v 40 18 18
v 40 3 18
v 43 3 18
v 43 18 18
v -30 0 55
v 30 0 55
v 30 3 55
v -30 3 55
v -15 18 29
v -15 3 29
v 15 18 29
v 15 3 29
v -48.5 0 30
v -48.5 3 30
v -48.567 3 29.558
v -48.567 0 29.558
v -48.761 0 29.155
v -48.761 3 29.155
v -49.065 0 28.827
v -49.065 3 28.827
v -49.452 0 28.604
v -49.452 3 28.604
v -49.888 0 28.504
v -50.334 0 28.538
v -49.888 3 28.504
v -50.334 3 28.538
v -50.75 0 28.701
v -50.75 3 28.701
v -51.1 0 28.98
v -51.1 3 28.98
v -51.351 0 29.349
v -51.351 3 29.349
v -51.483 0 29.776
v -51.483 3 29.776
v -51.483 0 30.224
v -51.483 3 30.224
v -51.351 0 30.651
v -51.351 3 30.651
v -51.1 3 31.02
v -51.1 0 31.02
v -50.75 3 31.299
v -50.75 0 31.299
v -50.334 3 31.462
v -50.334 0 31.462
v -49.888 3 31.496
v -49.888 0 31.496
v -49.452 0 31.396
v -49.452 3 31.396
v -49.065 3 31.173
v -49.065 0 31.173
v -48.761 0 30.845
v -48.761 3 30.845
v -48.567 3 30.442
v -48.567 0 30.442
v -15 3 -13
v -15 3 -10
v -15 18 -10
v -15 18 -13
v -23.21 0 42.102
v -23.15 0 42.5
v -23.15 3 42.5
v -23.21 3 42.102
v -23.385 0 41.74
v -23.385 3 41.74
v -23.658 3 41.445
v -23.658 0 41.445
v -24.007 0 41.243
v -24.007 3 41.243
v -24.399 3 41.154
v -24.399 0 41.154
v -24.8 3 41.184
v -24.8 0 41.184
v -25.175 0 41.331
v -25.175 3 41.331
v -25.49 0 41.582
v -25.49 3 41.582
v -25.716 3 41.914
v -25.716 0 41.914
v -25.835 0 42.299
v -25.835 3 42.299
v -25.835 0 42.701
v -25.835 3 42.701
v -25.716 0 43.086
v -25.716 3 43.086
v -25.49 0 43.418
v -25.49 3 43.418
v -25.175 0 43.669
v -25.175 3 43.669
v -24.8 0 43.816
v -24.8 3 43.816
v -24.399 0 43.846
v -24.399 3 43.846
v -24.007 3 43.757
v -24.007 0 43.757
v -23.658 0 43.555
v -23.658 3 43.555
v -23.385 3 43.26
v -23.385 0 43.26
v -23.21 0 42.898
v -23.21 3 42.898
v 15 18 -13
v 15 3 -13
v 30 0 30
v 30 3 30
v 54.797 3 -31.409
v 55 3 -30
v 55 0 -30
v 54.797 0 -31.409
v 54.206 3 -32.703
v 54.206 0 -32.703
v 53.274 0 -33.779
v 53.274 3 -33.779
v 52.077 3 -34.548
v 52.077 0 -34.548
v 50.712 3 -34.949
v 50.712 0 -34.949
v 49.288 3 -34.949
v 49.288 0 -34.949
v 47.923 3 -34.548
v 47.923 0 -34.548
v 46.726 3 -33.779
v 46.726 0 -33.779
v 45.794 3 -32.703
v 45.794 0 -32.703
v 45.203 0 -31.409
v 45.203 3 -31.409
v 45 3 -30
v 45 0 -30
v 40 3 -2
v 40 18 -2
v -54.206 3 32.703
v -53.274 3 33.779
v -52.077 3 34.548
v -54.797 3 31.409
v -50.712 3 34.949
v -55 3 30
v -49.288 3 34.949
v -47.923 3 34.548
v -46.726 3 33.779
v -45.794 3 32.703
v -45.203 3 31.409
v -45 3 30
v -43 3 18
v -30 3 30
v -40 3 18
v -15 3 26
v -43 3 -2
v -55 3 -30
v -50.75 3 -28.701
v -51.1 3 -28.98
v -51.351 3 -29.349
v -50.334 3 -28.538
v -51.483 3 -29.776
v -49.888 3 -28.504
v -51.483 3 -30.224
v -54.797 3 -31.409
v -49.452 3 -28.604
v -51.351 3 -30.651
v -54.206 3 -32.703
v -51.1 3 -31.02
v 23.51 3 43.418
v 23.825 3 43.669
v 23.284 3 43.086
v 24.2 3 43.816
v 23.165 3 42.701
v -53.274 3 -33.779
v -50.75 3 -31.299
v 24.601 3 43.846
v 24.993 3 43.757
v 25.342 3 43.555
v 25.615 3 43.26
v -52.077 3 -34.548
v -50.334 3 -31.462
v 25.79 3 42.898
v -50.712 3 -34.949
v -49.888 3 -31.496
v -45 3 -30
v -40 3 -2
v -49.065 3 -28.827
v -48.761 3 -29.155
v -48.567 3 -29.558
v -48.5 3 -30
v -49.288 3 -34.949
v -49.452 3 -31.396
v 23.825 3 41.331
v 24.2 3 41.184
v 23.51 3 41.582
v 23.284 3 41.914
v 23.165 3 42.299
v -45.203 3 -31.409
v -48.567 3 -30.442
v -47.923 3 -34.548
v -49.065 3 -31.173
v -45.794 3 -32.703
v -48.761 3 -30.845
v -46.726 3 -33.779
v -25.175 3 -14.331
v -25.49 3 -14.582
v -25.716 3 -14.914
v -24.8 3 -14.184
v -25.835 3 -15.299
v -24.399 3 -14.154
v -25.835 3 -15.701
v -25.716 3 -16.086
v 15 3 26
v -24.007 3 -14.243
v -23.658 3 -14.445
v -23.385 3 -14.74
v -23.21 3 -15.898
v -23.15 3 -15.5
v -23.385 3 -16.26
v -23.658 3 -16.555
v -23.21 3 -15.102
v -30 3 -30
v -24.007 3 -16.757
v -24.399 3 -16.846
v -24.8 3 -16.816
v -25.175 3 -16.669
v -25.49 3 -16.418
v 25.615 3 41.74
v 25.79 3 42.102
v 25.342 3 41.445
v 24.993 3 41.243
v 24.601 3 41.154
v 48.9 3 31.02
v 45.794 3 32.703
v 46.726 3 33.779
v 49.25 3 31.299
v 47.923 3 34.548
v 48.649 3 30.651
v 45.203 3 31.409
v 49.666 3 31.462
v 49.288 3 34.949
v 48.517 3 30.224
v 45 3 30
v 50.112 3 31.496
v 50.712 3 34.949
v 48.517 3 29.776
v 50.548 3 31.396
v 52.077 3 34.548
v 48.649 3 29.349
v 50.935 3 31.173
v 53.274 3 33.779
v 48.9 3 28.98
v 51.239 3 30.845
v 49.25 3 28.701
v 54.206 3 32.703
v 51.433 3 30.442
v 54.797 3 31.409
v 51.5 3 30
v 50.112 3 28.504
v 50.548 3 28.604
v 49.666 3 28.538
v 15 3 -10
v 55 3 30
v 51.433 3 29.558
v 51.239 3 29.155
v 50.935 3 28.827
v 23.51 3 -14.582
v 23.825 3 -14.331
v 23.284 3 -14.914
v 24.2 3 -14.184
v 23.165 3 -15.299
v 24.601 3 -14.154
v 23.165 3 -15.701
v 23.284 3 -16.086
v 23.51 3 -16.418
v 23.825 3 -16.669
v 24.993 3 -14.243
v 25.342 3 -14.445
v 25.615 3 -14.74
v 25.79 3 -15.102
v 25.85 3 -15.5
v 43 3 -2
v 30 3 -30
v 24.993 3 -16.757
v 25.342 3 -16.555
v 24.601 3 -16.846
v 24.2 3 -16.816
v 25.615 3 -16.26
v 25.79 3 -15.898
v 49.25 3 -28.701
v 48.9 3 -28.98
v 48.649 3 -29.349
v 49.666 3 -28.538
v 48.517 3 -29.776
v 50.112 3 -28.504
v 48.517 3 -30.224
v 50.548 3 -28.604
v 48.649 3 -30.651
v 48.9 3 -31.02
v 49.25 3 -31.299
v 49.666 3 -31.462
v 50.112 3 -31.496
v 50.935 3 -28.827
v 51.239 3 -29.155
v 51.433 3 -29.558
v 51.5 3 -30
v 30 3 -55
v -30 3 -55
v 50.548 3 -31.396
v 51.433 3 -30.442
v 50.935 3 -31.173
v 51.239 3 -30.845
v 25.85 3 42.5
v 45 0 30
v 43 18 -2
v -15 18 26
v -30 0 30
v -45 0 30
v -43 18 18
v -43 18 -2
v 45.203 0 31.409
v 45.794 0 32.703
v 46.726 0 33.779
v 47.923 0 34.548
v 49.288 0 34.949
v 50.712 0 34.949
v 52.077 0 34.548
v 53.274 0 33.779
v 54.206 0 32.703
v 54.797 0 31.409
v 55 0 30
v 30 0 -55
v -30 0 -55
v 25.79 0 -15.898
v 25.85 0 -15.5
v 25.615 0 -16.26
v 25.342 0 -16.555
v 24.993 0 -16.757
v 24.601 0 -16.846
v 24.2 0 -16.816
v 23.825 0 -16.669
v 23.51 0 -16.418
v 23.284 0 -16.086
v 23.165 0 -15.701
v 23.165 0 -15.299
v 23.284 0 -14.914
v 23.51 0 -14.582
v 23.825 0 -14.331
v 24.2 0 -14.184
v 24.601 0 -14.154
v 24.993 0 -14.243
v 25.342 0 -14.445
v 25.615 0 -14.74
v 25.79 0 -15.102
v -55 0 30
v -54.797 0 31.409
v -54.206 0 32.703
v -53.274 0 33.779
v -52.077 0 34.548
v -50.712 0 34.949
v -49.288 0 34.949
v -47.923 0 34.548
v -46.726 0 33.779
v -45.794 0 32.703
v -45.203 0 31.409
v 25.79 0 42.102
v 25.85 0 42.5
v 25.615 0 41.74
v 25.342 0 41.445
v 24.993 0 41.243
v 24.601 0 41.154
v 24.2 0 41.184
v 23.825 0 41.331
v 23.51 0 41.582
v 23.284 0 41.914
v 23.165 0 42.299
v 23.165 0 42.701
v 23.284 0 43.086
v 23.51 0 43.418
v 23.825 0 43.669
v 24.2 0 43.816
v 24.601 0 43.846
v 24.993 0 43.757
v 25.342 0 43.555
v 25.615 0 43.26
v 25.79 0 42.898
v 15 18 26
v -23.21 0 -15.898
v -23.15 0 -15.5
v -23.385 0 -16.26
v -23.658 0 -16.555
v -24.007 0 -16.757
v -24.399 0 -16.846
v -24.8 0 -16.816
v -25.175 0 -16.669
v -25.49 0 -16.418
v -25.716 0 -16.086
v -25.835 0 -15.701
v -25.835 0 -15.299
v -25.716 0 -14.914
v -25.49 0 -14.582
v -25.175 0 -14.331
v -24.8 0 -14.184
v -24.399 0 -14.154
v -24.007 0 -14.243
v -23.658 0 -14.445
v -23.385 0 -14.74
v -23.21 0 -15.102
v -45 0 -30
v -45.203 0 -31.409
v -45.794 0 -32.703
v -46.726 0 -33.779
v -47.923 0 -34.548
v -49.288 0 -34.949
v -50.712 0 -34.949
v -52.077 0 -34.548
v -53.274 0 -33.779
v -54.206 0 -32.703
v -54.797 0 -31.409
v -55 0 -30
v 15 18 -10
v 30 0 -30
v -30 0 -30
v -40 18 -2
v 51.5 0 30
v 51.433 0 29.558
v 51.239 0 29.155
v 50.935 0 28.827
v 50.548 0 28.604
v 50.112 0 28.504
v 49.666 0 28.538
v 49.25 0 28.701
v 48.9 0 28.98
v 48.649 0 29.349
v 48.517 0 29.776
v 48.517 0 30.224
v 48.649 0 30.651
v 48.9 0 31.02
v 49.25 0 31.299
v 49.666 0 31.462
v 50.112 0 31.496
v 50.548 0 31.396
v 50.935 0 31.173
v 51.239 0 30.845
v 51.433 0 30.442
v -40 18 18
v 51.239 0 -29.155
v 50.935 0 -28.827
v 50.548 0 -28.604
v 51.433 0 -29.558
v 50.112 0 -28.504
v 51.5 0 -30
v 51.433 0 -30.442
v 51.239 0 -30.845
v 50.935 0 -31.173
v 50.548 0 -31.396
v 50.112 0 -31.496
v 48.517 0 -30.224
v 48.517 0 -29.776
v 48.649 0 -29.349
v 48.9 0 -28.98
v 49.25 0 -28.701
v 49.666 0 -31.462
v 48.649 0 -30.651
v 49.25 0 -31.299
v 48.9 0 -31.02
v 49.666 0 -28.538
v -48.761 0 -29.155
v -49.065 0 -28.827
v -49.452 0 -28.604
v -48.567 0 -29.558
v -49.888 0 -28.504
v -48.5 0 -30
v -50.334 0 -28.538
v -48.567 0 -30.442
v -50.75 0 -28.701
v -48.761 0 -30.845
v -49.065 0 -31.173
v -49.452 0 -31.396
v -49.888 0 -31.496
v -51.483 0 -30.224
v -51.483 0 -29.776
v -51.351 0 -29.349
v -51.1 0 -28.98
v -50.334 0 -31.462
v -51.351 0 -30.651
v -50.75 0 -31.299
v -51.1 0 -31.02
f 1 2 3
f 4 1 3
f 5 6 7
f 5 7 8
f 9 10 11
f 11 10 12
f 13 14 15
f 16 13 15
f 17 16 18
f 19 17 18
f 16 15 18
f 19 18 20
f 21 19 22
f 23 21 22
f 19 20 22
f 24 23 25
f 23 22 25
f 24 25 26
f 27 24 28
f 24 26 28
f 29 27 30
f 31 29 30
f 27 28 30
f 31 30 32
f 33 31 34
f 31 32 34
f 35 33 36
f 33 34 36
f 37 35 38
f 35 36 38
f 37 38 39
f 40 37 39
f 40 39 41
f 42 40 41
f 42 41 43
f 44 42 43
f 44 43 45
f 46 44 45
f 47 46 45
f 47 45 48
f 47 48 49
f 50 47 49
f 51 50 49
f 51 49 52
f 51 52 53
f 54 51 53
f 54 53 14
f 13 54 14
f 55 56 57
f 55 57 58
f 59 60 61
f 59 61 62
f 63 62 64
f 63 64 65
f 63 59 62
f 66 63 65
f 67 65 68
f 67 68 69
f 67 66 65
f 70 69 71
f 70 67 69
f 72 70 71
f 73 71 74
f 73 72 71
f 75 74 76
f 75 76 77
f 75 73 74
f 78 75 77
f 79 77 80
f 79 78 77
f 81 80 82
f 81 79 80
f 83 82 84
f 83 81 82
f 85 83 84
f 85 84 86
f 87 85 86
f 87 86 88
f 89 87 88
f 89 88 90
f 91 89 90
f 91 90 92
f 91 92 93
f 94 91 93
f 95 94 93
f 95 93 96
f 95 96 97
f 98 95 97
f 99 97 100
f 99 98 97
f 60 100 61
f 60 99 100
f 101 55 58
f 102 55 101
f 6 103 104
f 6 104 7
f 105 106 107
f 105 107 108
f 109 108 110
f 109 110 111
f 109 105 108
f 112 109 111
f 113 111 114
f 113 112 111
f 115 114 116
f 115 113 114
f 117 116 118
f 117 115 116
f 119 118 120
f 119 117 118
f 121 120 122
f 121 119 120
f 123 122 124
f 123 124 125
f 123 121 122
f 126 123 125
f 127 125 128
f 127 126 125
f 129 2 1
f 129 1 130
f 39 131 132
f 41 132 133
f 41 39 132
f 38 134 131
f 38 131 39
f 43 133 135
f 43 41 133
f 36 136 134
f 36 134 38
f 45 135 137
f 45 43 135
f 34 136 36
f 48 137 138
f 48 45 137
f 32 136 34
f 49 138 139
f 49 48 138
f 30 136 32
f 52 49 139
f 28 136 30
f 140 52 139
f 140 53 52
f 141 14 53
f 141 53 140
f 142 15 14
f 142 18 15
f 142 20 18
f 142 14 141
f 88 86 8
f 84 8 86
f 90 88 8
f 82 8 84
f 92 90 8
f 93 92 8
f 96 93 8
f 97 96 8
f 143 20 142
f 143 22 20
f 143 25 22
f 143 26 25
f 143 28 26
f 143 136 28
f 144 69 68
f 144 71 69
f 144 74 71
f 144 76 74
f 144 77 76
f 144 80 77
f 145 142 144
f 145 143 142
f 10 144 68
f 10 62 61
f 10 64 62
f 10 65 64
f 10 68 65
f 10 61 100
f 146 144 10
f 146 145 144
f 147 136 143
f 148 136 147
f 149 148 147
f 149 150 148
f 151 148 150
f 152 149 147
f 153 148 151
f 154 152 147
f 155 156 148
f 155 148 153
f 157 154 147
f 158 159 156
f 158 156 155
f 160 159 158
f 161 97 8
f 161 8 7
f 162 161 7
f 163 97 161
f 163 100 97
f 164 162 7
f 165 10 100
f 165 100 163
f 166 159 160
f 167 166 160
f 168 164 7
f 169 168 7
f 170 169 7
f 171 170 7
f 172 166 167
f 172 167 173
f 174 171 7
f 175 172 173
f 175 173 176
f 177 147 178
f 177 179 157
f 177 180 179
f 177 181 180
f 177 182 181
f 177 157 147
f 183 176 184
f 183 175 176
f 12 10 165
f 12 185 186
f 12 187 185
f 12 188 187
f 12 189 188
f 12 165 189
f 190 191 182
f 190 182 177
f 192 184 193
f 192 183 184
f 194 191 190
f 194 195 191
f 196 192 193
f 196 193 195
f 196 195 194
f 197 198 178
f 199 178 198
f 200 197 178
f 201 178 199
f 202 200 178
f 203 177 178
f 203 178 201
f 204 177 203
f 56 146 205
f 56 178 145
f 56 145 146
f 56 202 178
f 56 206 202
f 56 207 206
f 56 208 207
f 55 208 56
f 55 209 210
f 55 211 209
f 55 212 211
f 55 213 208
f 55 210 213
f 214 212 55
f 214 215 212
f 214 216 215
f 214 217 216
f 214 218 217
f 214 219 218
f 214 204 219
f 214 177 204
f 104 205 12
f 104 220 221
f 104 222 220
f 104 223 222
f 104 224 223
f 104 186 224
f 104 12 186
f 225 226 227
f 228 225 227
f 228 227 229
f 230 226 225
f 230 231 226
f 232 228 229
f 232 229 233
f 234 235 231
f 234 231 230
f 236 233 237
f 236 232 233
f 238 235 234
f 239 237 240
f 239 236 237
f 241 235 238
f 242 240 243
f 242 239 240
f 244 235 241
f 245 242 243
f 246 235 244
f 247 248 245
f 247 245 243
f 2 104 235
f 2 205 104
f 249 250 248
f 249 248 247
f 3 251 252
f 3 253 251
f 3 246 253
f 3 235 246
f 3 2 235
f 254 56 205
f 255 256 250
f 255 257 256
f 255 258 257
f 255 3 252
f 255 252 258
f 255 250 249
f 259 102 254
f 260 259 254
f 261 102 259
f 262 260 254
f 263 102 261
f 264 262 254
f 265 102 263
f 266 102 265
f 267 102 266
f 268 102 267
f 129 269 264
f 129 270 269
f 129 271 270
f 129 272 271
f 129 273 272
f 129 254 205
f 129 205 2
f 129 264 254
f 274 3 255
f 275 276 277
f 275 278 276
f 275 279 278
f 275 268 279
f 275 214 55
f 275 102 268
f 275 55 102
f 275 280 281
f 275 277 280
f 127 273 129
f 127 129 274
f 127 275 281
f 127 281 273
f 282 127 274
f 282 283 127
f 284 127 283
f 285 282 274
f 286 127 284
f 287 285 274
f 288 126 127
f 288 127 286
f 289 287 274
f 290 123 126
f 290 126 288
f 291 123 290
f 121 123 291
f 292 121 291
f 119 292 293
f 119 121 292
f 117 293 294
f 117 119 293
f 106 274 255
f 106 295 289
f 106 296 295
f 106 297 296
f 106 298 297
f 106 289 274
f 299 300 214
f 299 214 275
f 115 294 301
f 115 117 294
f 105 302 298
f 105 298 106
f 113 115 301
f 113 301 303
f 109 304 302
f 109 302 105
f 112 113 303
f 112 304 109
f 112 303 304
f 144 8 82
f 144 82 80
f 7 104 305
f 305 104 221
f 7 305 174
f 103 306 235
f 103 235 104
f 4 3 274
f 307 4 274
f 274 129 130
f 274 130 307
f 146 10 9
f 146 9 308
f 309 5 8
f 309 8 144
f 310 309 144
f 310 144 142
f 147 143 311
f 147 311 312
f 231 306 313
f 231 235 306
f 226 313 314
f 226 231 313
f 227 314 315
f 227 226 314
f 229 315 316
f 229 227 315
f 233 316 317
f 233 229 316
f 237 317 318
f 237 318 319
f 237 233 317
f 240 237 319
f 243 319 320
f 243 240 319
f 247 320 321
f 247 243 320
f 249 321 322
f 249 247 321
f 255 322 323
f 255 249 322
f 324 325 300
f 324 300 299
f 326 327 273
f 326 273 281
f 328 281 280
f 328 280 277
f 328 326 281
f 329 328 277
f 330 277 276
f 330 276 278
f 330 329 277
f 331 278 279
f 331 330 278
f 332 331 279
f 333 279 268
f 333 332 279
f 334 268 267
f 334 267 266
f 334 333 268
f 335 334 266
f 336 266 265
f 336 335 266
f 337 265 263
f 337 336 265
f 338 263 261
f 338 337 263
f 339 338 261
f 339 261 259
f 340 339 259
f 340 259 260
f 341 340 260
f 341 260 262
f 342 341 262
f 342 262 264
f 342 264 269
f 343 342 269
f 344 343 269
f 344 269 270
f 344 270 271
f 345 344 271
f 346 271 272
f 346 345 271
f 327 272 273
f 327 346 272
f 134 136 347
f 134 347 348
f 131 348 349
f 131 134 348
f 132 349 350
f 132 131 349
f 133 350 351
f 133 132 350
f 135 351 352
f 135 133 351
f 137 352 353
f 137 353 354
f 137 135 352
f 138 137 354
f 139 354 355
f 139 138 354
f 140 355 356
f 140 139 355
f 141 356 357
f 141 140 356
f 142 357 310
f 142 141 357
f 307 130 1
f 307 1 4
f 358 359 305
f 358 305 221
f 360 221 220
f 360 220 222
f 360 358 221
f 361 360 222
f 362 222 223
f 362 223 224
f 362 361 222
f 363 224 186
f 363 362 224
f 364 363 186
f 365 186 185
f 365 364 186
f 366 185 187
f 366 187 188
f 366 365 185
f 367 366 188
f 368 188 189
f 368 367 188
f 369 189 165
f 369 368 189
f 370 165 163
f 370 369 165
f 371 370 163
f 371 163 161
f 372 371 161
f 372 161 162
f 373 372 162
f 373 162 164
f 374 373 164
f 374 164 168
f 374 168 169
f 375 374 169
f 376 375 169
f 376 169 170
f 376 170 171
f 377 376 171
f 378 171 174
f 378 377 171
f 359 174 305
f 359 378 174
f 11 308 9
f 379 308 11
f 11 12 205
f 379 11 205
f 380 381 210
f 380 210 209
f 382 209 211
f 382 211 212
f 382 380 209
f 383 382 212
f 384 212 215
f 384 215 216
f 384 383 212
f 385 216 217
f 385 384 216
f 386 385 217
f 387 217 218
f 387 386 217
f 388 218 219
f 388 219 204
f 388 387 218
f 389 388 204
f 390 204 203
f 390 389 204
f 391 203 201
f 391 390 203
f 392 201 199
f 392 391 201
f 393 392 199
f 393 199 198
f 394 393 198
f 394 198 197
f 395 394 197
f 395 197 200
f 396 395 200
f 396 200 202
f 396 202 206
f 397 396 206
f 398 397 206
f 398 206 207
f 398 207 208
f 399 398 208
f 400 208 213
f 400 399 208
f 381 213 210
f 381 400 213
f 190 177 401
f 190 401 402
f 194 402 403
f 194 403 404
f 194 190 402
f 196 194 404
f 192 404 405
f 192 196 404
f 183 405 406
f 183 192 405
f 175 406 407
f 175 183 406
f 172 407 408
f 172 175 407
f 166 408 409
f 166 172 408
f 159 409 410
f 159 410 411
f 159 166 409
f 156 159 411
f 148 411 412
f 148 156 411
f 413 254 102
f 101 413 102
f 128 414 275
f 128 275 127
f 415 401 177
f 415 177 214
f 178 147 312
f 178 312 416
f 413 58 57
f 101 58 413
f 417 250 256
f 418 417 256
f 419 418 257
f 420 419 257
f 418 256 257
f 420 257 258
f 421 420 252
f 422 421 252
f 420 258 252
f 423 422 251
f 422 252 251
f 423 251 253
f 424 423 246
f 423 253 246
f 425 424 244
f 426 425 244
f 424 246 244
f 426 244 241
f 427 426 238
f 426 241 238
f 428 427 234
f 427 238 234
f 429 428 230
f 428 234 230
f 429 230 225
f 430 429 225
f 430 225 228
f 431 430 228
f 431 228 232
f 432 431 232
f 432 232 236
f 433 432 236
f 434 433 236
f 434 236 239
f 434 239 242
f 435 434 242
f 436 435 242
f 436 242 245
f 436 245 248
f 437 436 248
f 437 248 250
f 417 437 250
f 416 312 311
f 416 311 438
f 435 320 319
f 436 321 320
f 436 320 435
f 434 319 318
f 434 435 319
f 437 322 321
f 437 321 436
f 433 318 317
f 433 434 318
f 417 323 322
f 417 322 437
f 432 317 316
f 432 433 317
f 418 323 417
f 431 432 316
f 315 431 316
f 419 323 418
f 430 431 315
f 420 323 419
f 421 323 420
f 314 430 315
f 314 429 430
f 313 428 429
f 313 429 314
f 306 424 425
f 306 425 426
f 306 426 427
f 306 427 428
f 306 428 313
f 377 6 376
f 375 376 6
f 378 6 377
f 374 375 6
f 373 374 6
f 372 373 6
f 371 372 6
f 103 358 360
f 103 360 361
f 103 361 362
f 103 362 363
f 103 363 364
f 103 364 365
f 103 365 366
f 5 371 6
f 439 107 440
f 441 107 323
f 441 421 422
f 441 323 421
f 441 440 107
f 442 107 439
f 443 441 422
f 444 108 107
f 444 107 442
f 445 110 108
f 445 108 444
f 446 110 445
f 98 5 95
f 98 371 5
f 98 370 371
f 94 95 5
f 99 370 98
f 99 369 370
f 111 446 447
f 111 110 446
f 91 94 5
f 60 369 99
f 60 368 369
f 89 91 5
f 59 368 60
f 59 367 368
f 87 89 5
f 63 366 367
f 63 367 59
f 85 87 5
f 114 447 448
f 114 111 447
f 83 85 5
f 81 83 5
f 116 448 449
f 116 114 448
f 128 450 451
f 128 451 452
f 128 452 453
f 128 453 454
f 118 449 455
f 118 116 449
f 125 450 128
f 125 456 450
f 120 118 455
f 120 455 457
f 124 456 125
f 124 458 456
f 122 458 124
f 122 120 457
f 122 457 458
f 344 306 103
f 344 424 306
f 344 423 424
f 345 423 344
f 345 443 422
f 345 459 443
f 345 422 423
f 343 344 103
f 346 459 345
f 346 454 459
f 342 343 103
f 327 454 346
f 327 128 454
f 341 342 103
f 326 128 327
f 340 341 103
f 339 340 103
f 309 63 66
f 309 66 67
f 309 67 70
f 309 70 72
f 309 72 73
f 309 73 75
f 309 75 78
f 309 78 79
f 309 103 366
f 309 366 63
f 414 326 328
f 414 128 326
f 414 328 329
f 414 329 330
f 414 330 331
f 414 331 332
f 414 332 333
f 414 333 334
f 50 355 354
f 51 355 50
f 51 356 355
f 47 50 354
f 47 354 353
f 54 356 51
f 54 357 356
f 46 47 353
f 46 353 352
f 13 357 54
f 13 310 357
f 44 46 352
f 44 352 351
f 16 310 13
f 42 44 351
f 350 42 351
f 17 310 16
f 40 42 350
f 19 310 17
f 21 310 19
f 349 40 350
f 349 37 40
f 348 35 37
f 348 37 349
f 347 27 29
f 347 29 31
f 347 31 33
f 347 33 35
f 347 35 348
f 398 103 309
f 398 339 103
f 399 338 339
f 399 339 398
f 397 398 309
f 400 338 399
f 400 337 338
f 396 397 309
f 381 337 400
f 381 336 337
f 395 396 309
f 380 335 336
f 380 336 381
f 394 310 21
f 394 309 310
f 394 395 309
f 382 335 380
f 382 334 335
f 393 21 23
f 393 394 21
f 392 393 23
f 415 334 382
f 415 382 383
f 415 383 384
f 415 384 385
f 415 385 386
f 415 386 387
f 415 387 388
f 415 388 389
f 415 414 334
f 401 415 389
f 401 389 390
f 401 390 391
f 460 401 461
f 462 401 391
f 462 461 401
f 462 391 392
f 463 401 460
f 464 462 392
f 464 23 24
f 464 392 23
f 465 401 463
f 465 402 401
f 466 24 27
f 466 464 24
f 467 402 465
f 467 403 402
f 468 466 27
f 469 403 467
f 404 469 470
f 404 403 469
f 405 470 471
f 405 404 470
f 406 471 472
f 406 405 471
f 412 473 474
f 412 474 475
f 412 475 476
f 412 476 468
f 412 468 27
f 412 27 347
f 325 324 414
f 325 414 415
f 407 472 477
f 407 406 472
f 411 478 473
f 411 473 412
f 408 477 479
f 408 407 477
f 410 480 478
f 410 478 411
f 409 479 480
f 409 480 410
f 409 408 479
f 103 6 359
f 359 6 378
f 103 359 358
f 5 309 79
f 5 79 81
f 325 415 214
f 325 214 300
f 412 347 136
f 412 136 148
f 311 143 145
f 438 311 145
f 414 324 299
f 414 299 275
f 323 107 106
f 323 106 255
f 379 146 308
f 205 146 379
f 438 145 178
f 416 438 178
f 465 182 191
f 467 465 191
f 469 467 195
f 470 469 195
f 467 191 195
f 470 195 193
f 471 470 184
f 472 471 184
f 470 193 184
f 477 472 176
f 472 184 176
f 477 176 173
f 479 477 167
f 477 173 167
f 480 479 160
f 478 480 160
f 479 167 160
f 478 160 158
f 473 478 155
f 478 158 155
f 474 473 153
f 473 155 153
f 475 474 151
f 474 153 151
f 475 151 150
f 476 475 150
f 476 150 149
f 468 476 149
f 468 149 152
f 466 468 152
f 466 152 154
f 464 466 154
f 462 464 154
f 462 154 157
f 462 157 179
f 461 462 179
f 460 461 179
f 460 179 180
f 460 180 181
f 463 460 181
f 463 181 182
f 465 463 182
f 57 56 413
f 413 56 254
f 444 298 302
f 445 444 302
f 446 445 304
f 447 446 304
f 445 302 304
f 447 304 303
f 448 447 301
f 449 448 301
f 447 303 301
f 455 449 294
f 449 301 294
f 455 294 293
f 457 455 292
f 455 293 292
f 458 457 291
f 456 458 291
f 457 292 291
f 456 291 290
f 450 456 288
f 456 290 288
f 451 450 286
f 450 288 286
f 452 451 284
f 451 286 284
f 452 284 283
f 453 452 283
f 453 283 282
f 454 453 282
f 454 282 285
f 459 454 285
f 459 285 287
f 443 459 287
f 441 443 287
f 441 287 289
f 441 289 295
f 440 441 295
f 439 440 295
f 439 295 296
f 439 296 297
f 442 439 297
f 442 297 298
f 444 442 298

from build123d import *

# Parameters (mm, degrees)
SKETCH2_R           = 1.35
BOSS_EXTRUDE1_DEPTH = 3
SKETCH3_R           = 5
BOSS_EXTRUDE2_DEPTH = 3
SKETCH4_R           = 1.5
CUT_EXTRUDE1_DEPTH  = 4
SKETCH5_W           = 3
SKETCH5_H           = 20
SKETCH5_W_2         = 30
SKETCH5_H_2         = 3
BOSS_EXTRUDE3_DEPTH = 15


with BuildPart() as part:
    # Sketch2 → Boss-Extrude1 (new body)
    with BuildSketch(Plane(origin=(0, 0, 0), x_dir=(1, 0, 0), z_dir=(0, 1, 0))):
        Polygon((30, -55), (-30, -55), (-30, -30), (-55, -30), (-55, 30), (-30, 30), (-30, 55), (30, 55), (30, 30), (55, 30), (55, -30), (30, -30), align=None)
        with Locations((24.5, -42.5)):
            Circle(SKETCH2_R, mode=Mode.SUBTRACT)
        with Locations((-24.5, -42.5)):
            Circle(SKETCH2_R, mode=Mode.SUBTRACT)
        with Locations((24.5, 15.5)):
            Circle(SKETCH2_R, mode=Mode.SUBTRACT)
        with Locations((-24.5, 15.5)):
            Circle(SKETCH2_R, mode=Mode.SUBTRACT)
    extrude(amount=BOSS_EXTRUDE1_DEPTH)

    # Sketch3 → Boss-Extrude2 (add)
    with BuildSketch(Plane(origin=(0, 3, 0), x_dir=(1, 0, 0), z_dir=(0, 1, 0))):
        with Locations((50, 30)):
            Circle(SKETCH3_R)
        with Locations((50, -30)):
            Circle(SKETCH3_R)
        with Locations((-50, -30)):
            Circle(SKETCH3_R)
        with Locations((-50, 30)):
            Circle(SKETCH3_R)
    extrude(amount=-BOSS_EXTRUDE2_DEPTH)

    # Sketch4 → Cut-Extrude1 (cut, through all)
    with BuildSketch(Plane(origin=(0, 3, 0), x_dir=(1, 0, 0), z_dir=(0, 1, 0))):
        with Locations((50, 30)):
            Circle(SKETCH4_R)
        with Locations((50, -30)):
            Circle(SKETCH4_R)
        with Locations((-50, -30)):
            Circle(SKETCH4_R)
        with Locations((-50, 30)):
            Circle(SKETCH4_R)
    extrude(amount=-CUT_EXTRUDE1_DEPTH, mode=Mode.SUBTRACT)

    # Sketch5 → Boss-Extrude3 (add)
    with BuildSketch(Plane(origin=(0, 3, 0), x_dir=(1, 0, 0), z_dir=(0, 1, 0))):
        with Locations((-41.5, -8)):
            Rectangle(SKETCH5_W, SKETCH5_H)
        with Locations((41.5, -8)):
            Rectangle(SKETCH5_W, SKETCH5_H)
        with Locations((0, 11.5)):
            Rectangle(SKETCH5_W_2, SKETCH5_H_2)
        with Locations((0, -27.5)):
            Rectangle(SKETCH5_W_2, SKETCH5_H_2)
    extrude(amount=BOSS_EXTRUDE3_DEPTH)


solid = part.part
